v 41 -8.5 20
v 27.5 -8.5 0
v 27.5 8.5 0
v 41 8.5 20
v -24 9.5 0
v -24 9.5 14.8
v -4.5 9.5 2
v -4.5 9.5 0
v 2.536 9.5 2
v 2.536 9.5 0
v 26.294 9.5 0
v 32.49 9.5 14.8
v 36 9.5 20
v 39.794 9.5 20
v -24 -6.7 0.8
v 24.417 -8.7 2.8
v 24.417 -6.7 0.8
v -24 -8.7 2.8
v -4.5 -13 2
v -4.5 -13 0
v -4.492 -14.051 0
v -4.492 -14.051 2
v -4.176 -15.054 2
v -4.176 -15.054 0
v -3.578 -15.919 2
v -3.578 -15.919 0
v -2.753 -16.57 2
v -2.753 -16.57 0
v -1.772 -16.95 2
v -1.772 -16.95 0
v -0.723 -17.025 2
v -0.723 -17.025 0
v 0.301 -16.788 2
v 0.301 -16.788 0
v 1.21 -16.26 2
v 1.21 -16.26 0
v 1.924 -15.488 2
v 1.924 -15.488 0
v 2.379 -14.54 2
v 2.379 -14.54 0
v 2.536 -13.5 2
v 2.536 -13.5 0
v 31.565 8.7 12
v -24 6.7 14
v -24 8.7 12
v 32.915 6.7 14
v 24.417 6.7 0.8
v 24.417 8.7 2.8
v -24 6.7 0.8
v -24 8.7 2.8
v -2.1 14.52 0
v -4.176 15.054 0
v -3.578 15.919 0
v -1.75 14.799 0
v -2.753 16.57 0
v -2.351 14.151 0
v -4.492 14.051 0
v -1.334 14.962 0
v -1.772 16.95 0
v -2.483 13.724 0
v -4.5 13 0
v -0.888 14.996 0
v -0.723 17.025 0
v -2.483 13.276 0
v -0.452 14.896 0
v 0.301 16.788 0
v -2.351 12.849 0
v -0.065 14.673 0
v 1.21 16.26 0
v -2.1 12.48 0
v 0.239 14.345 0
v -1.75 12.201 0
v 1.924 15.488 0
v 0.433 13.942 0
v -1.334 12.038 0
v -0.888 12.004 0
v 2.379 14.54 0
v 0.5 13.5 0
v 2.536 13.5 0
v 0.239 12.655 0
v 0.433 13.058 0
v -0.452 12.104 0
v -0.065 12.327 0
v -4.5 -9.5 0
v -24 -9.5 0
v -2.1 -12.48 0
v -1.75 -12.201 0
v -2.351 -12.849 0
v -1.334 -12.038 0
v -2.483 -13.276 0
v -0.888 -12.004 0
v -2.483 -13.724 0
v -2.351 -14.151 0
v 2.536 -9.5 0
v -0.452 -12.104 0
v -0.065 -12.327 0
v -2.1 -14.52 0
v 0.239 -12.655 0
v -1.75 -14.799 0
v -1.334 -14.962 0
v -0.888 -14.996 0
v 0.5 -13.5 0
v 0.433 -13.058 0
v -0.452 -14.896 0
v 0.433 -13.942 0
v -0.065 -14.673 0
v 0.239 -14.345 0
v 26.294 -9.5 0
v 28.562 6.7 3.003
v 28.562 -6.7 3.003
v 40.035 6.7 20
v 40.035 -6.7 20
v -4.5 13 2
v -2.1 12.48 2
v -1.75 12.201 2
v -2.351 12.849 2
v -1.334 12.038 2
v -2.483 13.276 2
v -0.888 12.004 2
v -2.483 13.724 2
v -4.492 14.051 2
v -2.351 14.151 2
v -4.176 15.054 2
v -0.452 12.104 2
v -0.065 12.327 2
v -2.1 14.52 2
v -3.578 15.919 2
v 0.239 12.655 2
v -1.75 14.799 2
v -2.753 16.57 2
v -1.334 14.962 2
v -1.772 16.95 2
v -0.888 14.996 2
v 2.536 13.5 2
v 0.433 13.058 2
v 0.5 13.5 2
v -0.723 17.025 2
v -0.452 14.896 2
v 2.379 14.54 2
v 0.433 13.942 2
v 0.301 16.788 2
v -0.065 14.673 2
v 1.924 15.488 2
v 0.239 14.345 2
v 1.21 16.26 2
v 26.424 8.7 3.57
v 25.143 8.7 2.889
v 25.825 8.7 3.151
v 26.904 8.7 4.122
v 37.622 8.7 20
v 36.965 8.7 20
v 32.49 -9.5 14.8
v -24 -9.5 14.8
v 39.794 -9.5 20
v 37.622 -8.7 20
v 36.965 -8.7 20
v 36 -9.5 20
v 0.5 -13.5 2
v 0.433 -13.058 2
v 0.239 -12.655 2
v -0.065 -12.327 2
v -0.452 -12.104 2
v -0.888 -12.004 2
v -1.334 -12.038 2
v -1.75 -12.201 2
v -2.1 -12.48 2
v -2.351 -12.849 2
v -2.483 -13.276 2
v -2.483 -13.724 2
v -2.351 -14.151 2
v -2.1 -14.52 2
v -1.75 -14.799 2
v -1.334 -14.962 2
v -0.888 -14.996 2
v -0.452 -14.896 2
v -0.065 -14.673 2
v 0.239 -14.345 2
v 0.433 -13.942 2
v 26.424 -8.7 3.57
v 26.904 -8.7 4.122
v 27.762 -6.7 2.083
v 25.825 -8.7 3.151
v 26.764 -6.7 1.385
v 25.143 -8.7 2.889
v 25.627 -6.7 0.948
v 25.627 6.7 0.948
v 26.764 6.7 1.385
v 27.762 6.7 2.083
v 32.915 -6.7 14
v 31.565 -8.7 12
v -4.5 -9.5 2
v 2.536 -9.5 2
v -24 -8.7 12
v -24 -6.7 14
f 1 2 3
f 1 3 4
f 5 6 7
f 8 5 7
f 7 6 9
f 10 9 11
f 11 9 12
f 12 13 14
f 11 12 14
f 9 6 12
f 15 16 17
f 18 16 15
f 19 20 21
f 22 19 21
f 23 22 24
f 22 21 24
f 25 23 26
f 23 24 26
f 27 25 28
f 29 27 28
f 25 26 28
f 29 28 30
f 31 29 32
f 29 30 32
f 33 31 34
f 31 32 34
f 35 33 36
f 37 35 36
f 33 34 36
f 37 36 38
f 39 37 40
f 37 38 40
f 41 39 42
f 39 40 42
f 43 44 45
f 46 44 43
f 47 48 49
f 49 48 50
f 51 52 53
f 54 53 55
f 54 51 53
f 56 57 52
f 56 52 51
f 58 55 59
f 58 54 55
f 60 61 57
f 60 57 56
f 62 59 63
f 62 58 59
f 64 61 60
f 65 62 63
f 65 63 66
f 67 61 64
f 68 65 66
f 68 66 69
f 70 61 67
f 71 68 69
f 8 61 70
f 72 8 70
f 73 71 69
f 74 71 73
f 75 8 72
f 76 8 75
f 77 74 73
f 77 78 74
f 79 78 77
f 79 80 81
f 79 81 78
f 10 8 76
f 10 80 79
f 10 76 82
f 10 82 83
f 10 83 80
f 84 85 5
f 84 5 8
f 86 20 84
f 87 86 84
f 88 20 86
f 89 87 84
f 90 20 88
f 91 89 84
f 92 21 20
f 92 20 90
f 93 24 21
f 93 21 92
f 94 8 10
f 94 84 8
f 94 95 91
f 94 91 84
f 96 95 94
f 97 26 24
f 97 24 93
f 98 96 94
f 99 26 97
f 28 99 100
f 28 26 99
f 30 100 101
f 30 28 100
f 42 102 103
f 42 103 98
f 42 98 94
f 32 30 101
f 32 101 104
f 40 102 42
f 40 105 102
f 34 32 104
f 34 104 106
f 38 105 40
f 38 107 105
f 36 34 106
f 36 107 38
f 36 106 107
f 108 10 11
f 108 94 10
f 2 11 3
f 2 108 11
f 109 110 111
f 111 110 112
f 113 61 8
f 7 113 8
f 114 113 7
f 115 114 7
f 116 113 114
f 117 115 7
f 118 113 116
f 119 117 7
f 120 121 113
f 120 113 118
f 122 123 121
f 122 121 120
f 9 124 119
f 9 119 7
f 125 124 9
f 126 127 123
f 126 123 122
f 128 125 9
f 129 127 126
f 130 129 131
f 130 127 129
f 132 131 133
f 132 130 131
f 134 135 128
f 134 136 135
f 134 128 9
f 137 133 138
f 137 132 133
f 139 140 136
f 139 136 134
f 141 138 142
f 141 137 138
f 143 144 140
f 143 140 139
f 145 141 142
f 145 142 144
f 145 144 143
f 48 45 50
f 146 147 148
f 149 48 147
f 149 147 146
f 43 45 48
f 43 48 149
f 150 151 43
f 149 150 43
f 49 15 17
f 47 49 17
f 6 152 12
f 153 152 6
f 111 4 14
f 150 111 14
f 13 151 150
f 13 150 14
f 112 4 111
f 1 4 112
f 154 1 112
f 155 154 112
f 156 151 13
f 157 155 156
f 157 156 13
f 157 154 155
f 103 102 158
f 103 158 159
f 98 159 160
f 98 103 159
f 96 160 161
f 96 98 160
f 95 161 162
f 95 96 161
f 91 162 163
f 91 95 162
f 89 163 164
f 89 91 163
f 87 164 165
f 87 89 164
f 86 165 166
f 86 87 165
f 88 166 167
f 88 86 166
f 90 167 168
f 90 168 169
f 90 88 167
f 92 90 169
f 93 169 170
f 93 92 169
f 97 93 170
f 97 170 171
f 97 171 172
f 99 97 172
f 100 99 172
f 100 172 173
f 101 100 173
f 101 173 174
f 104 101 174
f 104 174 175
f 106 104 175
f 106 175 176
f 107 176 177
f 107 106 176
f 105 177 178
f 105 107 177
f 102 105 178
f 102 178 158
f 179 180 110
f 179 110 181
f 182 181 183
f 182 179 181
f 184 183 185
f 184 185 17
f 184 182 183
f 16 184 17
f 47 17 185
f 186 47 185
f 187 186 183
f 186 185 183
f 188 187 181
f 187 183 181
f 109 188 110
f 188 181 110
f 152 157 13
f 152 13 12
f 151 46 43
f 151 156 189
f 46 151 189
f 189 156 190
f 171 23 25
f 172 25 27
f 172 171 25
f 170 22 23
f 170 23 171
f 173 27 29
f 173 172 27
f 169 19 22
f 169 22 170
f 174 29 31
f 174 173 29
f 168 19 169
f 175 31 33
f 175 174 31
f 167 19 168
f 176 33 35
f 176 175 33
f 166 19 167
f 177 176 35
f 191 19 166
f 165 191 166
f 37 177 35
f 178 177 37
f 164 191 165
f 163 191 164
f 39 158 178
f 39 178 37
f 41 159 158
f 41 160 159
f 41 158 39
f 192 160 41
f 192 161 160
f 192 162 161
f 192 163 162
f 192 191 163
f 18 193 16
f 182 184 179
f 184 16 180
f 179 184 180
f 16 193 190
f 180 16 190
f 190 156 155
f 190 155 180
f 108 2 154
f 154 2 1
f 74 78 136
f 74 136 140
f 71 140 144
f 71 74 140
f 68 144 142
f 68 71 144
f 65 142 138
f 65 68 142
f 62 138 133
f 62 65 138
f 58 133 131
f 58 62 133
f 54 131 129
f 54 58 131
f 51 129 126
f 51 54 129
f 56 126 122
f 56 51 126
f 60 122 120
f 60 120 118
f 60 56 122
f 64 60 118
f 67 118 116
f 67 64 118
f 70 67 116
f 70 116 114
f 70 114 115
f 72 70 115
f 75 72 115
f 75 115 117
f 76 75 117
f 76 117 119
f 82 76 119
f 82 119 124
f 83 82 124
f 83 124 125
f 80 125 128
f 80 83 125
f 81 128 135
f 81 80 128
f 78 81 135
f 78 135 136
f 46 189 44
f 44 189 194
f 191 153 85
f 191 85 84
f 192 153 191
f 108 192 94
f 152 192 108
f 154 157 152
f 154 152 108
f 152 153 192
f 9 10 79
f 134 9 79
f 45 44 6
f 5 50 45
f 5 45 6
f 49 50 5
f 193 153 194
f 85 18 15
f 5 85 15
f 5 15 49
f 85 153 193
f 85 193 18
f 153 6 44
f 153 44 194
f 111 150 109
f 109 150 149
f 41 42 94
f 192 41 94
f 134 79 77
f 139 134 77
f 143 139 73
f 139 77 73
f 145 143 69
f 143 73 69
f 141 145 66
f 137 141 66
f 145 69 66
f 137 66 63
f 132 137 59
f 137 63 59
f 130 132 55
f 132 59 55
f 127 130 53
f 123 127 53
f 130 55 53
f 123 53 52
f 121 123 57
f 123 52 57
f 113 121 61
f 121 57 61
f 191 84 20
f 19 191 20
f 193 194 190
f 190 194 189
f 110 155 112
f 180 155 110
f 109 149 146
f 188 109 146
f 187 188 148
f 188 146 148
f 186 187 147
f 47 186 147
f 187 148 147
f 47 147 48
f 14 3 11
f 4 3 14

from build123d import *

# Parameters (mm, degrees)
F2_DEPTH = 9.5
F3_T     = -0.8
F4_R     = 5
F5_SIZE  = 2
F0_R     = 1.5
F6_DEPTH = 2
F7_SIZE  = 1


with BuildPart() as f2:
    # F1 (on Front) → F2 (new body, symmetric)
    with BuildSketch(Plane.XZ):
        Polygon((-24, 0), (27.5, 0), (41, 20), (36, 20), (32.49, 14.8), (-24, 14.8), align=None)
    extrude(amount=F2_DEPTH, both=True)

    # F3
    f3_openings = [f2.faces().sort_by_distance(p)[0] for p in [
        (-24, 0, 7.4),
        (38.5, 0, 20),
    ]]
    offset(amount=F3_T, openings=f3_openings, kind=Kind.INTERSECTION)

    # F4
    f4_edges = [f2.edges().sort_by_distance(p)[0] for p in [
        (27.074806, 0, 0.8),
    ]]
    fillet(f4_edges, radius=F4_R)

    # F5
    f5_edges = [f2.edges().sort_by_distance(p)[0] for p in [
        (4.457597, -8.7, 14),
        (4.457597, 8.7, 14),
        (0.208671, 8.7, 0.8),
        (0.208671, -8.7, 0.8),
        (26.763954, 8.7, 1.384866),
        (34.298195, 8.7, 11.501318),
        (26.763954, -8.7, 1.384866),
        (34.298195, -8.7, 11.501318),
    ]]
    chamfer(f5_edges, length=F5_SIZE)

    # F0 (on Top) → F6 (join)
    with BuildSketch(Plane.XY):
        with BuildLine():
            Line((2.5, -9.5), (-4.5, -9.5))
            Line((-4.5, -9.5), (-4.5, -13))
            ThreePointArc((-4.5, -13), (-1.2506305341, -17.0266392409), (2.5355339059, -13.5))
            Line((2.5355339059, -13.5), (2.5355339059, -9.5))
            Line((2.5355339059, -9.5), (2.5, -9.5))
        make_face()
        with Locations((-1, -13.5)):
            Circle(F0_R, mode=Mode.SUBTRACT)
        with BuildLine():
            Line((-4.5, 13), (-4.5, 9.5))
            Line((-4.5, 9.5), (2.5, 9.5))
            Line((2.5, 9.5), (2.5355339059, 9.5))
            Line((2.5355339059, 9.5), (2.5355339059, 13.5))
            ThreePointArc((2.5355339059, 13.5), (-1.2506305341, 17.0266392409), (-4.5, 13))
        make_face()
        with Locations((-1, 13.5)):
            Circle(F0_R, mode=Mode.SUBTRACT)
    extrude(amount=F6_DEPTH)

    # F7
    f7_edges = [f2.edges().sort_by_distance(p)[0] for p in [
        (34.25, 9.5, 10),
        (34.25, -9.5, 10),
    ]]
    chamfer(f7_edges, length=F7_SIZE)


solid = f2.part
